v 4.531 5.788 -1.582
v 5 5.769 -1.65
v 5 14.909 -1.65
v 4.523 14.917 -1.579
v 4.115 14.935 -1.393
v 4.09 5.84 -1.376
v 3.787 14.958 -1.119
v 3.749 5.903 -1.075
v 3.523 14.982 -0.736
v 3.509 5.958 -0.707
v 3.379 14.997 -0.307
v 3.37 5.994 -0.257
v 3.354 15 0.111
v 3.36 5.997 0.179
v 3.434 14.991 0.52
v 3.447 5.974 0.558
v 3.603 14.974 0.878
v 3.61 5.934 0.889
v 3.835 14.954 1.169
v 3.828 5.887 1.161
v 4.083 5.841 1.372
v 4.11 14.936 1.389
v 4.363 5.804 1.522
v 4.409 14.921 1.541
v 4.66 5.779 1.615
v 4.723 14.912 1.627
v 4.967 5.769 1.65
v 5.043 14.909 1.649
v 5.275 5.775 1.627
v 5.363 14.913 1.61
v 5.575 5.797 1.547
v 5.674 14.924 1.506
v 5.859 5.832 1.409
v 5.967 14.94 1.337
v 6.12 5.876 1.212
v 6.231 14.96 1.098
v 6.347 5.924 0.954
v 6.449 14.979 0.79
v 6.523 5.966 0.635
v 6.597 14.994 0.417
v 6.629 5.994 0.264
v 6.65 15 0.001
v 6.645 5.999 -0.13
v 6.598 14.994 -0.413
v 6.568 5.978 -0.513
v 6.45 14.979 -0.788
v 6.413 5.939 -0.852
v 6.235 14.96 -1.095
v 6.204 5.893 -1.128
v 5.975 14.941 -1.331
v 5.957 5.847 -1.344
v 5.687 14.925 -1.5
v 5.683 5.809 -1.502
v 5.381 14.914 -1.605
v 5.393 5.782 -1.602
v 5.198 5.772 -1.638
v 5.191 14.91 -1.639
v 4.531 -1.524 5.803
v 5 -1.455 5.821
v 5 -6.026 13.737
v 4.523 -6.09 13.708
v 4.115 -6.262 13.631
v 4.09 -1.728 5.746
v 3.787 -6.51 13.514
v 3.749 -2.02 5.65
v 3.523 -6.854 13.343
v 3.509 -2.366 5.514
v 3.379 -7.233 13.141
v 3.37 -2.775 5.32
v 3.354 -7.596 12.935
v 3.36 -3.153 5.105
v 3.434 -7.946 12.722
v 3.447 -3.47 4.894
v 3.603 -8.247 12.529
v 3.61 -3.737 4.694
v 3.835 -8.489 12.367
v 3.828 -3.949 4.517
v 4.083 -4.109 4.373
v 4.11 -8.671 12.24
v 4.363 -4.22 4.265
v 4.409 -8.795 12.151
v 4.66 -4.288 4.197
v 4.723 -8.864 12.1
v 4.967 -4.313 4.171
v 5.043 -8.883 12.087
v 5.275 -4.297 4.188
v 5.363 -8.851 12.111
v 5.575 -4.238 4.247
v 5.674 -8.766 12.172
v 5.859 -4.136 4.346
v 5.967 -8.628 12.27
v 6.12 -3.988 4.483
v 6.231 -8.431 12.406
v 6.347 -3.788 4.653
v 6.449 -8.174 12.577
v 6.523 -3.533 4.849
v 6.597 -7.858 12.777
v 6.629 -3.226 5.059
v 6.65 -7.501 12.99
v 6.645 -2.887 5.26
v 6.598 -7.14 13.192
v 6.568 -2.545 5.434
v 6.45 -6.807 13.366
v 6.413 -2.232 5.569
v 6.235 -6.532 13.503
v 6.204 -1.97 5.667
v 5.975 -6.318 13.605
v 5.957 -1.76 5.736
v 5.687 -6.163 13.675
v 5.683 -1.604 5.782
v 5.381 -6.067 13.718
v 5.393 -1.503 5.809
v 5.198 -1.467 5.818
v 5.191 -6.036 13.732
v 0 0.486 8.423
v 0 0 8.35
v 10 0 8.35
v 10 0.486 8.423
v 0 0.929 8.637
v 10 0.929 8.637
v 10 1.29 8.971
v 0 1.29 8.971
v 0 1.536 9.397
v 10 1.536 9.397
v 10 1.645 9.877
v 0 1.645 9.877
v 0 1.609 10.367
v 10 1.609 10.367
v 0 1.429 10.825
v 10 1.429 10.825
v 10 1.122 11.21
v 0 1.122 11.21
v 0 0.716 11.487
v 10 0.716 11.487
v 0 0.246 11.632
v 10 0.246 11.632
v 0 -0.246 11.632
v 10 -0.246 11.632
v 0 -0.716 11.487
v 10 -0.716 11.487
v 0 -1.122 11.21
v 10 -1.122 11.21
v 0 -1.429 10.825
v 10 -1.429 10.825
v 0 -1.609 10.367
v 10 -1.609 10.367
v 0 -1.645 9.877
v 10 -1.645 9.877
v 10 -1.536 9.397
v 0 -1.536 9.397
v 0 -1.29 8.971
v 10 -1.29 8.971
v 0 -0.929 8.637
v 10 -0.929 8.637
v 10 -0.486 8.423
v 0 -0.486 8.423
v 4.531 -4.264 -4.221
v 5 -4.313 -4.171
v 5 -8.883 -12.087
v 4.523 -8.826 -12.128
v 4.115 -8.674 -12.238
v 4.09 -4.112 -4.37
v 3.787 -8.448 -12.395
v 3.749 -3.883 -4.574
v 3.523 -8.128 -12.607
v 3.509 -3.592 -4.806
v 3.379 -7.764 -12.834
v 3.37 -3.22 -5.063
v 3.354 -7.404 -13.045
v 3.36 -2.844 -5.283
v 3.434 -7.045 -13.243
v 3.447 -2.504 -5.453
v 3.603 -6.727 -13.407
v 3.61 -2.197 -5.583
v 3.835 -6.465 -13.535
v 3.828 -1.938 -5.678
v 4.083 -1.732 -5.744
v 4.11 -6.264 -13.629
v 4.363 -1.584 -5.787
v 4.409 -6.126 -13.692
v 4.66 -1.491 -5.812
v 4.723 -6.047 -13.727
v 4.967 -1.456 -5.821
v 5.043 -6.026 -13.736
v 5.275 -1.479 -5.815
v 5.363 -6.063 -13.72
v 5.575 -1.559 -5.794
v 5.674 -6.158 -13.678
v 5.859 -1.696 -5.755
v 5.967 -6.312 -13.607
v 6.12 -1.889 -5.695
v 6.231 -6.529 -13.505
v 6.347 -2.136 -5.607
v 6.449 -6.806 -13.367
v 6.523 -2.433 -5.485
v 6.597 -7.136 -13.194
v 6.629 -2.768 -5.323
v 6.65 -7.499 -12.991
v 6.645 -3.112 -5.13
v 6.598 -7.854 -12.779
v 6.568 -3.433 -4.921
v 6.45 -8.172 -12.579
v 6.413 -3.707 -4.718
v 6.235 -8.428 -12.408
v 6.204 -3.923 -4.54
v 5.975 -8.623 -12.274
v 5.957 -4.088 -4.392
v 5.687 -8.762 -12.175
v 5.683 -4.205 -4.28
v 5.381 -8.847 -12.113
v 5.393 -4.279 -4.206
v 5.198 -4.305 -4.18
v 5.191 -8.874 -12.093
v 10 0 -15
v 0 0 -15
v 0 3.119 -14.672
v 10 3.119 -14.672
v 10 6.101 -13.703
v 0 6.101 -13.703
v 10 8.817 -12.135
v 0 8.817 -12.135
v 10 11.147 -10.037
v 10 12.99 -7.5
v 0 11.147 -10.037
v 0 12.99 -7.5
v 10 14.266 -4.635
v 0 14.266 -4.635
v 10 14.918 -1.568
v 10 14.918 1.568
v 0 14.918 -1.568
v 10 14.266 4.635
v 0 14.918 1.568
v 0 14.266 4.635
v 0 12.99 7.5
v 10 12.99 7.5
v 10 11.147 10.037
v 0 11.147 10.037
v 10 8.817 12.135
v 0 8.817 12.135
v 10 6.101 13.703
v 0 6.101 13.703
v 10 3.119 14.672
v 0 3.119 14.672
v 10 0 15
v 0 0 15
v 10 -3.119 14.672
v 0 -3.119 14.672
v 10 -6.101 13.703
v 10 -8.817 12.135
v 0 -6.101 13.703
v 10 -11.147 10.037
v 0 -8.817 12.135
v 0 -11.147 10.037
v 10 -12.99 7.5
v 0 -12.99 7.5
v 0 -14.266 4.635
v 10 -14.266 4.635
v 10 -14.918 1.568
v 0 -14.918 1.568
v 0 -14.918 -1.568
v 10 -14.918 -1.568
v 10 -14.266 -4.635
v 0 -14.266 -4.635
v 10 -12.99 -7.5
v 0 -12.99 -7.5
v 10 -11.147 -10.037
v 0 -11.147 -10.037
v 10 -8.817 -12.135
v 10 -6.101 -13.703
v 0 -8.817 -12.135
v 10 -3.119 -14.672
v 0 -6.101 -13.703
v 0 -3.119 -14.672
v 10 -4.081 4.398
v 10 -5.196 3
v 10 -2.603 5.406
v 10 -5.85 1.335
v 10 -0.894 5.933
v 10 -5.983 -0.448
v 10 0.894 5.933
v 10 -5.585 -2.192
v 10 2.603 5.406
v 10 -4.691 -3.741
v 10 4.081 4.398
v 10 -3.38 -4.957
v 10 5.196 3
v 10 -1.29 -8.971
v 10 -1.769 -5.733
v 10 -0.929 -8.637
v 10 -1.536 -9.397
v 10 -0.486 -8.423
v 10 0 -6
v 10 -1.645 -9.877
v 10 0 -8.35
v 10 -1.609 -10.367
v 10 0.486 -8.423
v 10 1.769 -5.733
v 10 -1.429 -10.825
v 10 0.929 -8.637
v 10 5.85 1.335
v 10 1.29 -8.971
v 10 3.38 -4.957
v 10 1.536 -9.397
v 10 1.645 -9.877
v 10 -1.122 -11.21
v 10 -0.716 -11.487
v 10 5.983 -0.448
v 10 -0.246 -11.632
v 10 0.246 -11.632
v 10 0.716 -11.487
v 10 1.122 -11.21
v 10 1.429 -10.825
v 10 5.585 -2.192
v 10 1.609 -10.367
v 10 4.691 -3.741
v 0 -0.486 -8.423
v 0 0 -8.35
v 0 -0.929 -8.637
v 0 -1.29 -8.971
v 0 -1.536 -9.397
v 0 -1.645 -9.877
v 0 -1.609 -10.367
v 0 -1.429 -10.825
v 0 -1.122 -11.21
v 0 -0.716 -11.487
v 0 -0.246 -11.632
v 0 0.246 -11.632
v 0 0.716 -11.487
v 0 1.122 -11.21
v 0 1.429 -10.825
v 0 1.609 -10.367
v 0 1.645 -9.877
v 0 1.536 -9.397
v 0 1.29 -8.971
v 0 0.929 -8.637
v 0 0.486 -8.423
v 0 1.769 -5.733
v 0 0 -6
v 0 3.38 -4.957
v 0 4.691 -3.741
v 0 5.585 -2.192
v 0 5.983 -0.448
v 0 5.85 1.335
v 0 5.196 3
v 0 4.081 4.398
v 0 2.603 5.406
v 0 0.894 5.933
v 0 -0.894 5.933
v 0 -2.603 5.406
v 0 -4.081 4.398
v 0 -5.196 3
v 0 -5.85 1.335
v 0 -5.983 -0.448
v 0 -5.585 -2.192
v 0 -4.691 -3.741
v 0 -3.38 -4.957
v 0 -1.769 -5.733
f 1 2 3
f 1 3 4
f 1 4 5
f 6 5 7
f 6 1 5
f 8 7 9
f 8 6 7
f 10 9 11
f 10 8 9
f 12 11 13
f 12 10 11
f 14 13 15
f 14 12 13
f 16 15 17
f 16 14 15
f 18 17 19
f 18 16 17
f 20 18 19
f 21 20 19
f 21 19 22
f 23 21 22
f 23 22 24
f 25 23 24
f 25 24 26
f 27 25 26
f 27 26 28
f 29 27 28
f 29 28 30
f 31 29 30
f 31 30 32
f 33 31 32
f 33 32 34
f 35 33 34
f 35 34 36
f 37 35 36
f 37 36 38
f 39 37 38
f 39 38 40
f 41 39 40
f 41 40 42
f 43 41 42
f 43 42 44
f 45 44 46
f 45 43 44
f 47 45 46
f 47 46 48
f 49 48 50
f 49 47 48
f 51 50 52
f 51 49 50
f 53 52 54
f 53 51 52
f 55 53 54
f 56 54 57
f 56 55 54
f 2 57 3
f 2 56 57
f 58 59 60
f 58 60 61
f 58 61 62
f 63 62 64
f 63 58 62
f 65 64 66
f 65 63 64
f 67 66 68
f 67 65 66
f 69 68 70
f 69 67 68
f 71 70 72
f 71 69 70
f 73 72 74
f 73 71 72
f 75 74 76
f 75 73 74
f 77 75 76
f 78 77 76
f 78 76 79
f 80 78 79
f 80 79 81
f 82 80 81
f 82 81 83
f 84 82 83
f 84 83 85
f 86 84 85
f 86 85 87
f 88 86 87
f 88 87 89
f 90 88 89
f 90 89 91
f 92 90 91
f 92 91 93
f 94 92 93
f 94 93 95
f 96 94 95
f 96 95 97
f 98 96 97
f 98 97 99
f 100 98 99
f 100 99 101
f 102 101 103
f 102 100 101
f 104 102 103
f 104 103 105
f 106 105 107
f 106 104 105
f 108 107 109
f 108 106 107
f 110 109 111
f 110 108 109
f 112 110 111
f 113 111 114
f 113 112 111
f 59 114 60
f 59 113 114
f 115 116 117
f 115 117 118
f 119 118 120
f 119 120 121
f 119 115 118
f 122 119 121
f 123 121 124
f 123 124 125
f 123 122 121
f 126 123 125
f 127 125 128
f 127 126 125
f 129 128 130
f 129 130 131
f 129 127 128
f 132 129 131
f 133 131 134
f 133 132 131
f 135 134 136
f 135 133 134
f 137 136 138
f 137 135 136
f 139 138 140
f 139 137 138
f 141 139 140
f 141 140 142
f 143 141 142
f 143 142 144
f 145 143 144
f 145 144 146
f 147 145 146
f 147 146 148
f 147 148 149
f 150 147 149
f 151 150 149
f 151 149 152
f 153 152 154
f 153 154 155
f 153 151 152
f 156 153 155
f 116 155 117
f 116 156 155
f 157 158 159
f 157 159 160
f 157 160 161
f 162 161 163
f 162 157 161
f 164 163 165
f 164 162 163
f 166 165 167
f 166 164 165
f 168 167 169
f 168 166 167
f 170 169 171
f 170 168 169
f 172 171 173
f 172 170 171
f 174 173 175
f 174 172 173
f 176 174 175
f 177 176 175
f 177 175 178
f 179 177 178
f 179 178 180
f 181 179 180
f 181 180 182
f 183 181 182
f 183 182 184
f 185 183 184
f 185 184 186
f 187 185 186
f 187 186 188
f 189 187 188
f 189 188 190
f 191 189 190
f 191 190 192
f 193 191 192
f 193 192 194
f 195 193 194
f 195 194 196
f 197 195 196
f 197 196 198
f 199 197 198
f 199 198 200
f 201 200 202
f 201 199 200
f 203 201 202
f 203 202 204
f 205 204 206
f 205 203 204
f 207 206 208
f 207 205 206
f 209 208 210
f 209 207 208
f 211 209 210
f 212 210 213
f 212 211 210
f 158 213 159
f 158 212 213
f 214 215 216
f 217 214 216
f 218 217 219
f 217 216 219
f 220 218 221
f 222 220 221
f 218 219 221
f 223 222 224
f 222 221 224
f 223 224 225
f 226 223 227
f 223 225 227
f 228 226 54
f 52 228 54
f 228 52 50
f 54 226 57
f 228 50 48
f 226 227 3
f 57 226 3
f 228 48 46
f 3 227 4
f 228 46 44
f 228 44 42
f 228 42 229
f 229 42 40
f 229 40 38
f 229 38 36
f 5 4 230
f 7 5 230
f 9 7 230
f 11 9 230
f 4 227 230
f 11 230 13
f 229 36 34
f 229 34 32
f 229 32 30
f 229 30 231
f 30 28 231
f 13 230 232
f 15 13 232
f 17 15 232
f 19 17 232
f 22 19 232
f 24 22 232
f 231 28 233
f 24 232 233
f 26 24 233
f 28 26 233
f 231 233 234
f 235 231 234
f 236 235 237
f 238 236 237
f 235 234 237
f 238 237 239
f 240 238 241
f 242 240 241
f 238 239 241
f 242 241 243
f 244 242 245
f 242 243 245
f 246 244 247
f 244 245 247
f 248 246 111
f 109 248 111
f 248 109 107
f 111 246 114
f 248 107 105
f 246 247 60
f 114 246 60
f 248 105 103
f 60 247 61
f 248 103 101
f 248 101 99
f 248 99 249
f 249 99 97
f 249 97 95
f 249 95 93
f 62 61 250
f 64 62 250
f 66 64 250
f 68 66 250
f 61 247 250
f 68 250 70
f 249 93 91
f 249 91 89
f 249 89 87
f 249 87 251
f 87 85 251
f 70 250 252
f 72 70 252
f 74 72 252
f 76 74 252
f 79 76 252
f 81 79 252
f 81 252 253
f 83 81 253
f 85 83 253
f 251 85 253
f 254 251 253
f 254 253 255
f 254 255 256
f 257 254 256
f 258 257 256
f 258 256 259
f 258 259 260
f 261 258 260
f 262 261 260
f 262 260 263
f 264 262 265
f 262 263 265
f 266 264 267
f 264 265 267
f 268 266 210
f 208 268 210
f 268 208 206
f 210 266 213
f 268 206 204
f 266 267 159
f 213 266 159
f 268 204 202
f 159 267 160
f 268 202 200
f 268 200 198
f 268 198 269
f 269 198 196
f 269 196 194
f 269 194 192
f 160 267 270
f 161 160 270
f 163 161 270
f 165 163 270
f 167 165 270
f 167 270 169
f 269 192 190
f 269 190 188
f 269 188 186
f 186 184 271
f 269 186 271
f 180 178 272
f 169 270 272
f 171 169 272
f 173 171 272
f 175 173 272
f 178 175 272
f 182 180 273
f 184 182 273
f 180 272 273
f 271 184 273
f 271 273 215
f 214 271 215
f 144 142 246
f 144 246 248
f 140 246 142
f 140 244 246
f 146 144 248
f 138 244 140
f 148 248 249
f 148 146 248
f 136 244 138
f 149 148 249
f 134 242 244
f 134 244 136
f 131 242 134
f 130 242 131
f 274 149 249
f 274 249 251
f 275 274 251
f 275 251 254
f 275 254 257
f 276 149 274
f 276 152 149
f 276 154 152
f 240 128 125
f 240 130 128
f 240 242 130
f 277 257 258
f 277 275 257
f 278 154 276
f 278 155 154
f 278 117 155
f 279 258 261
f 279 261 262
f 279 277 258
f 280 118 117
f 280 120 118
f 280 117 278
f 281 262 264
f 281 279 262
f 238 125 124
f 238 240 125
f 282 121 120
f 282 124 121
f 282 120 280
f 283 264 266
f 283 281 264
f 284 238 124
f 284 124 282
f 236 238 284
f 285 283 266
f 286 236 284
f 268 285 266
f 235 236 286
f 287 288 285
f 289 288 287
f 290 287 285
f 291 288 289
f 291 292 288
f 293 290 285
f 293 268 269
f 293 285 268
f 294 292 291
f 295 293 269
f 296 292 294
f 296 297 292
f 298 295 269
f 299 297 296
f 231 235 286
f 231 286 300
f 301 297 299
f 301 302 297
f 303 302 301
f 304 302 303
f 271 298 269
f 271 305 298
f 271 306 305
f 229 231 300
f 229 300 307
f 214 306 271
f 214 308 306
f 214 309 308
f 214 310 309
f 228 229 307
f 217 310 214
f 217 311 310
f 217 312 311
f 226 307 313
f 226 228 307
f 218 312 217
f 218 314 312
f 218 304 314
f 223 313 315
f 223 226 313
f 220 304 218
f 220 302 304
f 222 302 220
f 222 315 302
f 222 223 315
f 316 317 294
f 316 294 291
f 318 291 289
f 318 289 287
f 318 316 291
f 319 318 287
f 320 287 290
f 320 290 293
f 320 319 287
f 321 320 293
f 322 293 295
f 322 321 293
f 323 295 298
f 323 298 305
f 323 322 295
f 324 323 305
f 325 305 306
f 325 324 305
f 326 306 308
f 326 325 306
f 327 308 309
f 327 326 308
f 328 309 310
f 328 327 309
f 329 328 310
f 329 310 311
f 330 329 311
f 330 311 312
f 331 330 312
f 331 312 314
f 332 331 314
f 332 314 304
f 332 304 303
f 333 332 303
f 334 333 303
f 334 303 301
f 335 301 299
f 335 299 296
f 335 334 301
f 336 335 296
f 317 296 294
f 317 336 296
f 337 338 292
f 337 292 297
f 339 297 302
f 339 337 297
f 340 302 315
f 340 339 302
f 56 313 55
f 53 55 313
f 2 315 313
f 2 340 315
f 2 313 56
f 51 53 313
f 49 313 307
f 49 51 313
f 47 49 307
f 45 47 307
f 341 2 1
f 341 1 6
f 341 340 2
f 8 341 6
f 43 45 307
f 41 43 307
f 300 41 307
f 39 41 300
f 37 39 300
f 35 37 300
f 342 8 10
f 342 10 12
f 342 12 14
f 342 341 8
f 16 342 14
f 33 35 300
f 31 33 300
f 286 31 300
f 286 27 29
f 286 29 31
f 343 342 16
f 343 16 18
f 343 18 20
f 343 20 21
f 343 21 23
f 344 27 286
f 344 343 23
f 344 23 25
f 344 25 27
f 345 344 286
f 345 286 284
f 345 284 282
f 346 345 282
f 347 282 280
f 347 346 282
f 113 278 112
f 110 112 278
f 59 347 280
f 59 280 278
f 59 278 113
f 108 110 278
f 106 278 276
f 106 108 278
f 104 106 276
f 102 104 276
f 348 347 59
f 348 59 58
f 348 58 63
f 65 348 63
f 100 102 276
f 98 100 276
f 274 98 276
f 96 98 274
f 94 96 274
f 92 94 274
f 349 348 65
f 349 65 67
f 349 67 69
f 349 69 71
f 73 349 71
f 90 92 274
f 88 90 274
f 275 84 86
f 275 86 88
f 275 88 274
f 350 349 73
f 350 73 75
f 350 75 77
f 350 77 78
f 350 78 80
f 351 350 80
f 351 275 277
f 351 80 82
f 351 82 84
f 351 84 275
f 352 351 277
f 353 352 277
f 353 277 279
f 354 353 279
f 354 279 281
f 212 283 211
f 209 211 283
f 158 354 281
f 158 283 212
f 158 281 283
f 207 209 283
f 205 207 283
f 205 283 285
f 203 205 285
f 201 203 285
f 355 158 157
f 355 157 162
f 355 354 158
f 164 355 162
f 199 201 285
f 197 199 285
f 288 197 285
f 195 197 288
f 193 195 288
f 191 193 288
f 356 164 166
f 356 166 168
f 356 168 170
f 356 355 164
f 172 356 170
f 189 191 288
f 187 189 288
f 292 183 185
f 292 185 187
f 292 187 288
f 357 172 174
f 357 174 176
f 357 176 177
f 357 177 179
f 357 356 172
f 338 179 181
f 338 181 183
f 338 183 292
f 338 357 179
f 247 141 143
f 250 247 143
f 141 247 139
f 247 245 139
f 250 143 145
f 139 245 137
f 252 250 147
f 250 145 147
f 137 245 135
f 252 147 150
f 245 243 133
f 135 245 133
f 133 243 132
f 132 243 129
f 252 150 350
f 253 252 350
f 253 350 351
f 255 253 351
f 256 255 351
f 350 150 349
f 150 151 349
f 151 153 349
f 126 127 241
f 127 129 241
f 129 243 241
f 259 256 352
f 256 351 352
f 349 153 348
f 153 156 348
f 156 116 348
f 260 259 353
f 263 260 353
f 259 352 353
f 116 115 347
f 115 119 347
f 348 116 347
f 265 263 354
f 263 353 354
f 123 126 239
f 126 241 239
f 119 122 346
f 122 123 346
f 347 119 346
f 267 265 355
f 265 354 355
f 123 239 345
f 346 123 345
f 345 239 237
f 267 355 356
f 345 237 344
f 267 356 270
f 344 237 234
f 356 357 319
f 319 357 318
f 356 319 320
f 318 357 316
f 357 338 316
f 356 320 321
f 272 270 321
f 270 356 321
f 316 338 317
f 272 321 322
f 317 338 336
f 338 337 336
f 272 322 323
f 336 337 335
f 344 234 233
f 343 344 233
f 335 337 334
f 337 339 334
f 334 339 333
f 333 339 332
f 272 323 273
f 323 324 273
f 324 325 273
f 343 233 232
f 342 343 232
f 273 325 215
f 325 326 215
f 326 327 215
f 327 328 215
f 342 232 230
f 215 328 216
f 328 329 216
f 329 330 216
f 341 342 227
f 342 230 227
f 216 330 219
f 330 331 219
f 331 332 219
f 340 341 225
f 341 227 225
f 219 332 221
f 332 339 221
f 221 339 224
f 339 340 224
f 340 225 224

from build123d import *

# Parameters (mm, degrees)
SKETCH_1_R               = 15
SKETCH_1_R_2             = 6
SKETCH_1_R_3             = 1.65
EXTRUDE_1_DEPTH          = 10
SKETCH_2_R               = 1.65
CUT_EXTRUDE_1_DEPTH      = 24.452078799
PATTERN_CIRCULAR_1_COUNT = 3


with BuildPart() as part:
    # ｽｹｯﾁ1 → ﾎﾞｽ - 押し出し1 (new body)
    with BuildSketch(Plane(origin=(0, 0, 0), x_dir=(0, 0, -1), z_dir=(1, 0, 0))):
        Circle(SKETCH_1_R)
        Circle(SKETCH_1_R_2, mode=Mode.SUBTRACT)
        with Locations((-10, 0)):
            Circle(SKETCH_1_R_3, mode=Mode.SUBTRACT)
        with Locations(Location((10, 0, 0), (0, 0, 180))):
            Circle(SKETCH_1_R_3, mode=Mode.SUBTRACT)
    extrude(amount=EXTRUDE_1_DEPTH)

    # ｽｹｯﾁ2 → ｶｯﾄ - 押し出し1 (cut, through all)
    with BuildSketch(Plane(origin=(0, 0, 0), x_dir=(1, 0, 0), z_dir=(0, 1, 0))):
        with Locations(Location((5, 0, 0), (0, 0, 90))):
            Circle(SKETCH_2_R)
    cut_extrude_1 = extrude(amount=CUT_EXTRUDE_1_DEPTH, mode=Mode.SUBTRACT)

    # 円形ﾊﾟﾀｰﾝ1: ｶｯﾄ - 押し出し1 ×3 about axis
    pattern_circular_1_axis = Axis((10, 0, 0), (1, 0, 0))
    for i in range(1, PATTERN_CIRCULAR_1_COUNT):
        add(cut_extrude_1.rotate(pattern_circular_1_axis, i * 360 / PATTERN_CIRCULAR_1_COUNT), mode=Mode.SUBTRACT)


solid = part.part
